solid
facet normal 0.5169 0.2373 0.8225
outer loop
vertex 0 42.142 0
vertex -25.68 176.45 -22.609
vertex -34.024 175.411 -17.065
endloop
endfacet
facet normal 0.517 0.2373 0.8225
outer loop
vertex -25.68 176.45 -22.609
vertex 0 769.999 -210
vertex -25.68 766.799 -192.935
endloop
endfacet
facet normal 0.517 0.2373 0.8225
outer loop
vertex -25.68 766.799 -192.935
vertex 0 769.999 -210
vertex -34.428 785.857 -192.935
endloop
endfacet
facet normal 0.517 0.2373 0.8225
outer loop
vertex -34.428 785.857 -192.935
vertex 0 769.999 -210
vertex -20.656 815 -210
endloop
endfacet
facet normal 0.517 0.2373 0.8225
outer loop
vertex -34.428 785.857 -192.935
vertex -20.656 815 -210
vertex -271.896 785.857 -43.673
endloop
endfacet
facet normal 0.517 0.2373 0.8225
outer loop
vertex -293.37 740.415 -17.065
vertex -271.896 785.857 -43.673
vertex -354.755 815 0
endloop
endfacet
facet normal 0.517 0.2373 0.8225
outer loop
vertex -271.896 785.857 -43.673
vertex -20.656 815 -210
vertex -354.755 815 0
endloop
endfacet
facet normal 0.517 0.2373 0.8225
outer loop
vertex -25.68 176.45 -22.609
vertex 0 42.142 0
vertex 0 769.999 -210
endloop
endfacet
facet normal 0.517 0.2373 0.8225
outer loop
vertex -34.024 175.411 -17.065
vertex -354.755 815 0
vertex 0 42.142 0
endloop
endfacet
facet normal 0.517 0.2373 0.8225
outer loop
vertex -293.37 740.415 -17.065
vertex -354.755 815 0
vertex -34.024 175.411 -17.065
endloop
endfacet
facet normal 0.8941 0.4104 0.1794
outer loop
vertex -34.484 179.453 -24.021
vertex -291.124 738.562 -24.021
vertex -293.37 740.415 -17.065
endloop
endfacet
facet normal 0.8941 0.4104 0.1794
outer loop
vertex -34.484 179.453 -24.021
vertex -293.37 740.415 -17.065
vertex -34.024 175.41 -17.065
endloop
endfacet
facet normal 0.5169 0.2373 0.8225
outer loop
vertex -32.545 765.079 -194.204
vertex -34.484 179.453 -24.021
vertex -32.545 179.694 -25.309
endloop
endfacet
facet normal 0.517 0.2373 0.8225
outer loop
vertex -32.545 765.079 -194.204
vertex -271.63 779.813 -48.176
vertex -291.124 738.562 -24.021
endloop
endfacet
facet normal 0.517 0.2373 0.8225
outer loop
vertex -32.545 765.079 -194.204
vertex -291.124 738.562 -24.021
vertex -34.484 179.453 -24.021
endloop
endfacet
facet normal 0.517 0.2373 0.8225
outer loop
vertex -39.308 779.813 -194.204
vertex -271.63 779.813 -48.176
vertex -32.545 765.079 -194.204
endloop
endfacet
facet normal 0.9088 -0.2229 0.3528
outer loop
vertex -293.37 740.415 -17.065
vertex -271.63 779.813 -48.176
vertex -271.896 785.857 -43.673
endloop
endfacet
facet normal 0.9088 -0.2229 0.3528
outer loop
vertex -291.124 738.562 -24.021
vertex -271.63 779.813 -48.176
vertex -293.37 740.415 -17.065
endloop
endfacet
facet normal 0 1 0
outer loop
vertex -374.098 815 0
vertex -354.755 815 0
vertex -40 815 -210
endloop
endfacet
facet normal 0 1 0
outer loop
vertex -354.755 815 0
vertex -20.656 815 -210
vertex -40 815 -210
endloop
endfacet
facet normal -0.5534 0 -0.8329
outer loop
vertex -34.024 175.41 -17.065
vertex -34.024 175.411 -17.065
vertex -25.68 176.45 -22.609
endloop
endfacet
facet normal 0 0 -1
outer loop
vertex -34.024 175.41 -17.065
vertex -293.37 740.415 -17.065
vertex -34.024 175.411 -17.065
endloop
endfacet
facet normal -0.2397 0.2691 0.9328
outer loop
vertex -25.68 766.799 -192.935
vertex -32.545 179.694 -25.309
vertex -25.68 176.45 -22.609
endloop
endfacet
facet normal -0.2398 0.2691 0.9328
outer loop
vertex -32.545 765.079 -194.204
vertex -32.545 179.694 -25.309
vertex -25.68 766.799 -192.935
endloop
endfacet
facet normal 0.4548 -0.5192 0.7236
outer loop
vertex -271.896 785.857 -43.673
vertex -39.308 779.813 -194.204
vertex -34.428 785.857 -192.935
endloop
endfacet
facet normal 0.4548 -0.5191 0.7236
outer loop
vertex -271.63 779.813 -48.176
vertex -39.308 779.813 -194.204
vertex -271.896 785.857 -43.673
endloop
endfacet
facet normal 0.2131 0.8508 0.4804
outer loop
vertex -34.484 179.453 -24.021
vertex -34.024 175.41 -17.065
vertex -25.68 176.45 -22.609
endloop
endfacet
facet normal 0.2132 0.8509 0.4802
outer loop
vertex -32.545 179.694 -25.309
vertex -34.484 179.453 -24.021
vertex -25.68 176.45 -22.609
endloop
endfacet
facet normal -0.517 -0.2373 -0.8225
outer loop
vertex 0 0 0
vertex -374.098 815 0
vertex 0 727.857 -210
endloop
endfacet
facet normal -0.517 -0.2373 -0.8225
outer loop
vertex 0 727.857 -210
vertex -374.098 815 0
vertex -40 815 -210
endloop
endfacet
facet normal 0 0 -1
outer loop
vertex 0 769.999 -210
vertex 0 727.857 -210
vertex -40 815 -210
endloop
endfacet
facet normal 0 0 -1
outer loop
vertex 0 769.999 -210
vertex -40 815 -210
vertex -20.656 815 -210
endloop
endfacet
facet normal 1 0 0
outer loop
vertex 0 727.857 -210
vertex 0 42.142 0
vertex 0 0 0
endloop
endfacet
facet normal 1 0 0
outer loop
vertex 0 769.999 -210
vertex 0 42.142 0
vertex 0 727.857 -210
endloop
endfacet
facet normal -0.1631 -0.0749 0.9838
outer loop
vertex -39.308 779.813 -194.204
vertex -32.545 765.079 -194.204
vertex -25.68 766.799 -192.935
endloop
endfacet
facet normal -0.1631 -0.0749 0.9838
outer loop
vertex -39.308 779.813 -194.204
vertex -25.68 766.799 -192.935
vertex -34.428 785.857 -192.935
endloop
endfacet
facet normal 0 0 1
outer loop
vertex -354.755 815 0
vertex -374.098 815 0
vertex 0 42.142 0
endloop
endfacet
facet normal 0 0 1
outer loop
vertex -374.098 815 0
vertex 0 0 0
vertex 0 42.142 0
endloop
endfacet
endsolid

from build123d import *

# Parameters (mm, degrees)
BOSS_EXTRU_1_DEPTH      = 210
ENL_V_MAT_EXTRU_4_DEPTH = 922.018231875
ENL_V_MAT_EXTRU_5_DEPTH = 922.018231875
ENL_V_MAT_EXTRU_6_DEPTH = 923.94578116
ENL_V_MAT_EXTRU_7_DEPTH = 5
CHANFREIN1_SIZE         = 5


with BuildPart() as part:
    # Esquisse1 → Boss.-Extru.1 (new body)
    with BuildSketch(Plane.XY):
        Polygon((0, 0), (0, 815), (-374.098360656, 815), align=None)
    extrude(amount=-BOSS_EXTRU_1_DEPTH)

    # Esquisse4 → Enlèv. mat.-Extru.4 (cut, through all)
    with BuildSketch(Plane(origin=(0, 815, 0), x_dir=(1, 0, 0), z_dir=(0, 1, 0))):
        Polygon((-40, 210), (-374.098360656, 0), (-374.098360656, 210), align=None)
    extrude(amount=-ENL_V_MAT_EXTRU_4_DEPTH, mode=Mode.SUBTRACT)

    # Esquisse5 → Enlèv. mat.-Extru.5 (cut, through all)
    with BuildSketch(Plane(origin=(0, 0, 0), x_dir=(-0.8560075896570557, 0.14330783348955523, 0.49670300110835625), z_dir=(-0.5169632544480486, -0.23729460859910434, -0.8224598849064191))):
        Polygon((437.026920294, 783.059419447), (0, 0), (-104.307630233, 58.214282686), (12.488254061, 841.273702133), (46.728557648, 841.273702133), align=None)
    extrude(amount=ENL_V_MAT_EXTRU_5_DEPTH, mode=Mode.SUBTRACT)

    # Esquisse6 → Enlèv. mat.-Extru.6 (cut, through all)
    with BuildSketch(Plane(origin=(5.169632544, 2.372946086, 8.224598849), x_dir=(-0.8560075896570557, 0.14330783348955523, 0.49670300110835625), z_dir=(-0.5169632544480486, -0.23729460859910434, -0.8224598849064191))):
        Polygon((437.026920294, 783.059419447), (46.728557648, 841.273702133), (12.488254061, 841.273702133), (0, 757.546051675), (0, 0), align=None)
    extrude(amount=-ENL_V_MAT_EXTRU_6_DEPTH, mode=Mode.SUBTRACT)

    # Esquisse7 → Enlèv. mat.-Extru.7 (cut)
    with BuildSketch(Plane(origin=(5.169632544, 2.372946086, 8.224598849), x_dir=(0.8560075896570555, -0.14330783348955536, -0.4967030011083565), z_dir=(0.5169632544480489, 0.23729460859910445, 0.8224598849064189))):
        Polygon((-45.786058342, 173.266527892), (-36.039236809, 175.802293869), (-36.039236809, 790.231286712), (-46.25858999, 808.542197087), (-323.672371858, 767.165020382), (-348.758261389, 716.128366398), align=None)
    extrude(amount=-ENL_V_MAT_EXTRU_7_DEPTH, mode=Mode.SUBTRACT)

    # Chanfrein1
    chanfrein1_edges = [part.edges().sort_by_distance(p)[0] for p in [
        (-32.436720565, 174.743826797, -23.949101615),
        (-166.281649801, 456.726474452, -21.176992916),
        (-285.218046516, 761.94965633, -34.481068848),
        (-155.747039223, 784.670394973, -122.416375357),
        (-32.638965904, 775.141493599, -197.047605933),
        (-28.265043962, 470.438107301, -111.884408124),
    ]]
    chamfer(chanfrein1_edges, length=CHANFREIN1_SIZE - 0.0001)  # a hair under: the kernel refuses the full size


solid = part.part
